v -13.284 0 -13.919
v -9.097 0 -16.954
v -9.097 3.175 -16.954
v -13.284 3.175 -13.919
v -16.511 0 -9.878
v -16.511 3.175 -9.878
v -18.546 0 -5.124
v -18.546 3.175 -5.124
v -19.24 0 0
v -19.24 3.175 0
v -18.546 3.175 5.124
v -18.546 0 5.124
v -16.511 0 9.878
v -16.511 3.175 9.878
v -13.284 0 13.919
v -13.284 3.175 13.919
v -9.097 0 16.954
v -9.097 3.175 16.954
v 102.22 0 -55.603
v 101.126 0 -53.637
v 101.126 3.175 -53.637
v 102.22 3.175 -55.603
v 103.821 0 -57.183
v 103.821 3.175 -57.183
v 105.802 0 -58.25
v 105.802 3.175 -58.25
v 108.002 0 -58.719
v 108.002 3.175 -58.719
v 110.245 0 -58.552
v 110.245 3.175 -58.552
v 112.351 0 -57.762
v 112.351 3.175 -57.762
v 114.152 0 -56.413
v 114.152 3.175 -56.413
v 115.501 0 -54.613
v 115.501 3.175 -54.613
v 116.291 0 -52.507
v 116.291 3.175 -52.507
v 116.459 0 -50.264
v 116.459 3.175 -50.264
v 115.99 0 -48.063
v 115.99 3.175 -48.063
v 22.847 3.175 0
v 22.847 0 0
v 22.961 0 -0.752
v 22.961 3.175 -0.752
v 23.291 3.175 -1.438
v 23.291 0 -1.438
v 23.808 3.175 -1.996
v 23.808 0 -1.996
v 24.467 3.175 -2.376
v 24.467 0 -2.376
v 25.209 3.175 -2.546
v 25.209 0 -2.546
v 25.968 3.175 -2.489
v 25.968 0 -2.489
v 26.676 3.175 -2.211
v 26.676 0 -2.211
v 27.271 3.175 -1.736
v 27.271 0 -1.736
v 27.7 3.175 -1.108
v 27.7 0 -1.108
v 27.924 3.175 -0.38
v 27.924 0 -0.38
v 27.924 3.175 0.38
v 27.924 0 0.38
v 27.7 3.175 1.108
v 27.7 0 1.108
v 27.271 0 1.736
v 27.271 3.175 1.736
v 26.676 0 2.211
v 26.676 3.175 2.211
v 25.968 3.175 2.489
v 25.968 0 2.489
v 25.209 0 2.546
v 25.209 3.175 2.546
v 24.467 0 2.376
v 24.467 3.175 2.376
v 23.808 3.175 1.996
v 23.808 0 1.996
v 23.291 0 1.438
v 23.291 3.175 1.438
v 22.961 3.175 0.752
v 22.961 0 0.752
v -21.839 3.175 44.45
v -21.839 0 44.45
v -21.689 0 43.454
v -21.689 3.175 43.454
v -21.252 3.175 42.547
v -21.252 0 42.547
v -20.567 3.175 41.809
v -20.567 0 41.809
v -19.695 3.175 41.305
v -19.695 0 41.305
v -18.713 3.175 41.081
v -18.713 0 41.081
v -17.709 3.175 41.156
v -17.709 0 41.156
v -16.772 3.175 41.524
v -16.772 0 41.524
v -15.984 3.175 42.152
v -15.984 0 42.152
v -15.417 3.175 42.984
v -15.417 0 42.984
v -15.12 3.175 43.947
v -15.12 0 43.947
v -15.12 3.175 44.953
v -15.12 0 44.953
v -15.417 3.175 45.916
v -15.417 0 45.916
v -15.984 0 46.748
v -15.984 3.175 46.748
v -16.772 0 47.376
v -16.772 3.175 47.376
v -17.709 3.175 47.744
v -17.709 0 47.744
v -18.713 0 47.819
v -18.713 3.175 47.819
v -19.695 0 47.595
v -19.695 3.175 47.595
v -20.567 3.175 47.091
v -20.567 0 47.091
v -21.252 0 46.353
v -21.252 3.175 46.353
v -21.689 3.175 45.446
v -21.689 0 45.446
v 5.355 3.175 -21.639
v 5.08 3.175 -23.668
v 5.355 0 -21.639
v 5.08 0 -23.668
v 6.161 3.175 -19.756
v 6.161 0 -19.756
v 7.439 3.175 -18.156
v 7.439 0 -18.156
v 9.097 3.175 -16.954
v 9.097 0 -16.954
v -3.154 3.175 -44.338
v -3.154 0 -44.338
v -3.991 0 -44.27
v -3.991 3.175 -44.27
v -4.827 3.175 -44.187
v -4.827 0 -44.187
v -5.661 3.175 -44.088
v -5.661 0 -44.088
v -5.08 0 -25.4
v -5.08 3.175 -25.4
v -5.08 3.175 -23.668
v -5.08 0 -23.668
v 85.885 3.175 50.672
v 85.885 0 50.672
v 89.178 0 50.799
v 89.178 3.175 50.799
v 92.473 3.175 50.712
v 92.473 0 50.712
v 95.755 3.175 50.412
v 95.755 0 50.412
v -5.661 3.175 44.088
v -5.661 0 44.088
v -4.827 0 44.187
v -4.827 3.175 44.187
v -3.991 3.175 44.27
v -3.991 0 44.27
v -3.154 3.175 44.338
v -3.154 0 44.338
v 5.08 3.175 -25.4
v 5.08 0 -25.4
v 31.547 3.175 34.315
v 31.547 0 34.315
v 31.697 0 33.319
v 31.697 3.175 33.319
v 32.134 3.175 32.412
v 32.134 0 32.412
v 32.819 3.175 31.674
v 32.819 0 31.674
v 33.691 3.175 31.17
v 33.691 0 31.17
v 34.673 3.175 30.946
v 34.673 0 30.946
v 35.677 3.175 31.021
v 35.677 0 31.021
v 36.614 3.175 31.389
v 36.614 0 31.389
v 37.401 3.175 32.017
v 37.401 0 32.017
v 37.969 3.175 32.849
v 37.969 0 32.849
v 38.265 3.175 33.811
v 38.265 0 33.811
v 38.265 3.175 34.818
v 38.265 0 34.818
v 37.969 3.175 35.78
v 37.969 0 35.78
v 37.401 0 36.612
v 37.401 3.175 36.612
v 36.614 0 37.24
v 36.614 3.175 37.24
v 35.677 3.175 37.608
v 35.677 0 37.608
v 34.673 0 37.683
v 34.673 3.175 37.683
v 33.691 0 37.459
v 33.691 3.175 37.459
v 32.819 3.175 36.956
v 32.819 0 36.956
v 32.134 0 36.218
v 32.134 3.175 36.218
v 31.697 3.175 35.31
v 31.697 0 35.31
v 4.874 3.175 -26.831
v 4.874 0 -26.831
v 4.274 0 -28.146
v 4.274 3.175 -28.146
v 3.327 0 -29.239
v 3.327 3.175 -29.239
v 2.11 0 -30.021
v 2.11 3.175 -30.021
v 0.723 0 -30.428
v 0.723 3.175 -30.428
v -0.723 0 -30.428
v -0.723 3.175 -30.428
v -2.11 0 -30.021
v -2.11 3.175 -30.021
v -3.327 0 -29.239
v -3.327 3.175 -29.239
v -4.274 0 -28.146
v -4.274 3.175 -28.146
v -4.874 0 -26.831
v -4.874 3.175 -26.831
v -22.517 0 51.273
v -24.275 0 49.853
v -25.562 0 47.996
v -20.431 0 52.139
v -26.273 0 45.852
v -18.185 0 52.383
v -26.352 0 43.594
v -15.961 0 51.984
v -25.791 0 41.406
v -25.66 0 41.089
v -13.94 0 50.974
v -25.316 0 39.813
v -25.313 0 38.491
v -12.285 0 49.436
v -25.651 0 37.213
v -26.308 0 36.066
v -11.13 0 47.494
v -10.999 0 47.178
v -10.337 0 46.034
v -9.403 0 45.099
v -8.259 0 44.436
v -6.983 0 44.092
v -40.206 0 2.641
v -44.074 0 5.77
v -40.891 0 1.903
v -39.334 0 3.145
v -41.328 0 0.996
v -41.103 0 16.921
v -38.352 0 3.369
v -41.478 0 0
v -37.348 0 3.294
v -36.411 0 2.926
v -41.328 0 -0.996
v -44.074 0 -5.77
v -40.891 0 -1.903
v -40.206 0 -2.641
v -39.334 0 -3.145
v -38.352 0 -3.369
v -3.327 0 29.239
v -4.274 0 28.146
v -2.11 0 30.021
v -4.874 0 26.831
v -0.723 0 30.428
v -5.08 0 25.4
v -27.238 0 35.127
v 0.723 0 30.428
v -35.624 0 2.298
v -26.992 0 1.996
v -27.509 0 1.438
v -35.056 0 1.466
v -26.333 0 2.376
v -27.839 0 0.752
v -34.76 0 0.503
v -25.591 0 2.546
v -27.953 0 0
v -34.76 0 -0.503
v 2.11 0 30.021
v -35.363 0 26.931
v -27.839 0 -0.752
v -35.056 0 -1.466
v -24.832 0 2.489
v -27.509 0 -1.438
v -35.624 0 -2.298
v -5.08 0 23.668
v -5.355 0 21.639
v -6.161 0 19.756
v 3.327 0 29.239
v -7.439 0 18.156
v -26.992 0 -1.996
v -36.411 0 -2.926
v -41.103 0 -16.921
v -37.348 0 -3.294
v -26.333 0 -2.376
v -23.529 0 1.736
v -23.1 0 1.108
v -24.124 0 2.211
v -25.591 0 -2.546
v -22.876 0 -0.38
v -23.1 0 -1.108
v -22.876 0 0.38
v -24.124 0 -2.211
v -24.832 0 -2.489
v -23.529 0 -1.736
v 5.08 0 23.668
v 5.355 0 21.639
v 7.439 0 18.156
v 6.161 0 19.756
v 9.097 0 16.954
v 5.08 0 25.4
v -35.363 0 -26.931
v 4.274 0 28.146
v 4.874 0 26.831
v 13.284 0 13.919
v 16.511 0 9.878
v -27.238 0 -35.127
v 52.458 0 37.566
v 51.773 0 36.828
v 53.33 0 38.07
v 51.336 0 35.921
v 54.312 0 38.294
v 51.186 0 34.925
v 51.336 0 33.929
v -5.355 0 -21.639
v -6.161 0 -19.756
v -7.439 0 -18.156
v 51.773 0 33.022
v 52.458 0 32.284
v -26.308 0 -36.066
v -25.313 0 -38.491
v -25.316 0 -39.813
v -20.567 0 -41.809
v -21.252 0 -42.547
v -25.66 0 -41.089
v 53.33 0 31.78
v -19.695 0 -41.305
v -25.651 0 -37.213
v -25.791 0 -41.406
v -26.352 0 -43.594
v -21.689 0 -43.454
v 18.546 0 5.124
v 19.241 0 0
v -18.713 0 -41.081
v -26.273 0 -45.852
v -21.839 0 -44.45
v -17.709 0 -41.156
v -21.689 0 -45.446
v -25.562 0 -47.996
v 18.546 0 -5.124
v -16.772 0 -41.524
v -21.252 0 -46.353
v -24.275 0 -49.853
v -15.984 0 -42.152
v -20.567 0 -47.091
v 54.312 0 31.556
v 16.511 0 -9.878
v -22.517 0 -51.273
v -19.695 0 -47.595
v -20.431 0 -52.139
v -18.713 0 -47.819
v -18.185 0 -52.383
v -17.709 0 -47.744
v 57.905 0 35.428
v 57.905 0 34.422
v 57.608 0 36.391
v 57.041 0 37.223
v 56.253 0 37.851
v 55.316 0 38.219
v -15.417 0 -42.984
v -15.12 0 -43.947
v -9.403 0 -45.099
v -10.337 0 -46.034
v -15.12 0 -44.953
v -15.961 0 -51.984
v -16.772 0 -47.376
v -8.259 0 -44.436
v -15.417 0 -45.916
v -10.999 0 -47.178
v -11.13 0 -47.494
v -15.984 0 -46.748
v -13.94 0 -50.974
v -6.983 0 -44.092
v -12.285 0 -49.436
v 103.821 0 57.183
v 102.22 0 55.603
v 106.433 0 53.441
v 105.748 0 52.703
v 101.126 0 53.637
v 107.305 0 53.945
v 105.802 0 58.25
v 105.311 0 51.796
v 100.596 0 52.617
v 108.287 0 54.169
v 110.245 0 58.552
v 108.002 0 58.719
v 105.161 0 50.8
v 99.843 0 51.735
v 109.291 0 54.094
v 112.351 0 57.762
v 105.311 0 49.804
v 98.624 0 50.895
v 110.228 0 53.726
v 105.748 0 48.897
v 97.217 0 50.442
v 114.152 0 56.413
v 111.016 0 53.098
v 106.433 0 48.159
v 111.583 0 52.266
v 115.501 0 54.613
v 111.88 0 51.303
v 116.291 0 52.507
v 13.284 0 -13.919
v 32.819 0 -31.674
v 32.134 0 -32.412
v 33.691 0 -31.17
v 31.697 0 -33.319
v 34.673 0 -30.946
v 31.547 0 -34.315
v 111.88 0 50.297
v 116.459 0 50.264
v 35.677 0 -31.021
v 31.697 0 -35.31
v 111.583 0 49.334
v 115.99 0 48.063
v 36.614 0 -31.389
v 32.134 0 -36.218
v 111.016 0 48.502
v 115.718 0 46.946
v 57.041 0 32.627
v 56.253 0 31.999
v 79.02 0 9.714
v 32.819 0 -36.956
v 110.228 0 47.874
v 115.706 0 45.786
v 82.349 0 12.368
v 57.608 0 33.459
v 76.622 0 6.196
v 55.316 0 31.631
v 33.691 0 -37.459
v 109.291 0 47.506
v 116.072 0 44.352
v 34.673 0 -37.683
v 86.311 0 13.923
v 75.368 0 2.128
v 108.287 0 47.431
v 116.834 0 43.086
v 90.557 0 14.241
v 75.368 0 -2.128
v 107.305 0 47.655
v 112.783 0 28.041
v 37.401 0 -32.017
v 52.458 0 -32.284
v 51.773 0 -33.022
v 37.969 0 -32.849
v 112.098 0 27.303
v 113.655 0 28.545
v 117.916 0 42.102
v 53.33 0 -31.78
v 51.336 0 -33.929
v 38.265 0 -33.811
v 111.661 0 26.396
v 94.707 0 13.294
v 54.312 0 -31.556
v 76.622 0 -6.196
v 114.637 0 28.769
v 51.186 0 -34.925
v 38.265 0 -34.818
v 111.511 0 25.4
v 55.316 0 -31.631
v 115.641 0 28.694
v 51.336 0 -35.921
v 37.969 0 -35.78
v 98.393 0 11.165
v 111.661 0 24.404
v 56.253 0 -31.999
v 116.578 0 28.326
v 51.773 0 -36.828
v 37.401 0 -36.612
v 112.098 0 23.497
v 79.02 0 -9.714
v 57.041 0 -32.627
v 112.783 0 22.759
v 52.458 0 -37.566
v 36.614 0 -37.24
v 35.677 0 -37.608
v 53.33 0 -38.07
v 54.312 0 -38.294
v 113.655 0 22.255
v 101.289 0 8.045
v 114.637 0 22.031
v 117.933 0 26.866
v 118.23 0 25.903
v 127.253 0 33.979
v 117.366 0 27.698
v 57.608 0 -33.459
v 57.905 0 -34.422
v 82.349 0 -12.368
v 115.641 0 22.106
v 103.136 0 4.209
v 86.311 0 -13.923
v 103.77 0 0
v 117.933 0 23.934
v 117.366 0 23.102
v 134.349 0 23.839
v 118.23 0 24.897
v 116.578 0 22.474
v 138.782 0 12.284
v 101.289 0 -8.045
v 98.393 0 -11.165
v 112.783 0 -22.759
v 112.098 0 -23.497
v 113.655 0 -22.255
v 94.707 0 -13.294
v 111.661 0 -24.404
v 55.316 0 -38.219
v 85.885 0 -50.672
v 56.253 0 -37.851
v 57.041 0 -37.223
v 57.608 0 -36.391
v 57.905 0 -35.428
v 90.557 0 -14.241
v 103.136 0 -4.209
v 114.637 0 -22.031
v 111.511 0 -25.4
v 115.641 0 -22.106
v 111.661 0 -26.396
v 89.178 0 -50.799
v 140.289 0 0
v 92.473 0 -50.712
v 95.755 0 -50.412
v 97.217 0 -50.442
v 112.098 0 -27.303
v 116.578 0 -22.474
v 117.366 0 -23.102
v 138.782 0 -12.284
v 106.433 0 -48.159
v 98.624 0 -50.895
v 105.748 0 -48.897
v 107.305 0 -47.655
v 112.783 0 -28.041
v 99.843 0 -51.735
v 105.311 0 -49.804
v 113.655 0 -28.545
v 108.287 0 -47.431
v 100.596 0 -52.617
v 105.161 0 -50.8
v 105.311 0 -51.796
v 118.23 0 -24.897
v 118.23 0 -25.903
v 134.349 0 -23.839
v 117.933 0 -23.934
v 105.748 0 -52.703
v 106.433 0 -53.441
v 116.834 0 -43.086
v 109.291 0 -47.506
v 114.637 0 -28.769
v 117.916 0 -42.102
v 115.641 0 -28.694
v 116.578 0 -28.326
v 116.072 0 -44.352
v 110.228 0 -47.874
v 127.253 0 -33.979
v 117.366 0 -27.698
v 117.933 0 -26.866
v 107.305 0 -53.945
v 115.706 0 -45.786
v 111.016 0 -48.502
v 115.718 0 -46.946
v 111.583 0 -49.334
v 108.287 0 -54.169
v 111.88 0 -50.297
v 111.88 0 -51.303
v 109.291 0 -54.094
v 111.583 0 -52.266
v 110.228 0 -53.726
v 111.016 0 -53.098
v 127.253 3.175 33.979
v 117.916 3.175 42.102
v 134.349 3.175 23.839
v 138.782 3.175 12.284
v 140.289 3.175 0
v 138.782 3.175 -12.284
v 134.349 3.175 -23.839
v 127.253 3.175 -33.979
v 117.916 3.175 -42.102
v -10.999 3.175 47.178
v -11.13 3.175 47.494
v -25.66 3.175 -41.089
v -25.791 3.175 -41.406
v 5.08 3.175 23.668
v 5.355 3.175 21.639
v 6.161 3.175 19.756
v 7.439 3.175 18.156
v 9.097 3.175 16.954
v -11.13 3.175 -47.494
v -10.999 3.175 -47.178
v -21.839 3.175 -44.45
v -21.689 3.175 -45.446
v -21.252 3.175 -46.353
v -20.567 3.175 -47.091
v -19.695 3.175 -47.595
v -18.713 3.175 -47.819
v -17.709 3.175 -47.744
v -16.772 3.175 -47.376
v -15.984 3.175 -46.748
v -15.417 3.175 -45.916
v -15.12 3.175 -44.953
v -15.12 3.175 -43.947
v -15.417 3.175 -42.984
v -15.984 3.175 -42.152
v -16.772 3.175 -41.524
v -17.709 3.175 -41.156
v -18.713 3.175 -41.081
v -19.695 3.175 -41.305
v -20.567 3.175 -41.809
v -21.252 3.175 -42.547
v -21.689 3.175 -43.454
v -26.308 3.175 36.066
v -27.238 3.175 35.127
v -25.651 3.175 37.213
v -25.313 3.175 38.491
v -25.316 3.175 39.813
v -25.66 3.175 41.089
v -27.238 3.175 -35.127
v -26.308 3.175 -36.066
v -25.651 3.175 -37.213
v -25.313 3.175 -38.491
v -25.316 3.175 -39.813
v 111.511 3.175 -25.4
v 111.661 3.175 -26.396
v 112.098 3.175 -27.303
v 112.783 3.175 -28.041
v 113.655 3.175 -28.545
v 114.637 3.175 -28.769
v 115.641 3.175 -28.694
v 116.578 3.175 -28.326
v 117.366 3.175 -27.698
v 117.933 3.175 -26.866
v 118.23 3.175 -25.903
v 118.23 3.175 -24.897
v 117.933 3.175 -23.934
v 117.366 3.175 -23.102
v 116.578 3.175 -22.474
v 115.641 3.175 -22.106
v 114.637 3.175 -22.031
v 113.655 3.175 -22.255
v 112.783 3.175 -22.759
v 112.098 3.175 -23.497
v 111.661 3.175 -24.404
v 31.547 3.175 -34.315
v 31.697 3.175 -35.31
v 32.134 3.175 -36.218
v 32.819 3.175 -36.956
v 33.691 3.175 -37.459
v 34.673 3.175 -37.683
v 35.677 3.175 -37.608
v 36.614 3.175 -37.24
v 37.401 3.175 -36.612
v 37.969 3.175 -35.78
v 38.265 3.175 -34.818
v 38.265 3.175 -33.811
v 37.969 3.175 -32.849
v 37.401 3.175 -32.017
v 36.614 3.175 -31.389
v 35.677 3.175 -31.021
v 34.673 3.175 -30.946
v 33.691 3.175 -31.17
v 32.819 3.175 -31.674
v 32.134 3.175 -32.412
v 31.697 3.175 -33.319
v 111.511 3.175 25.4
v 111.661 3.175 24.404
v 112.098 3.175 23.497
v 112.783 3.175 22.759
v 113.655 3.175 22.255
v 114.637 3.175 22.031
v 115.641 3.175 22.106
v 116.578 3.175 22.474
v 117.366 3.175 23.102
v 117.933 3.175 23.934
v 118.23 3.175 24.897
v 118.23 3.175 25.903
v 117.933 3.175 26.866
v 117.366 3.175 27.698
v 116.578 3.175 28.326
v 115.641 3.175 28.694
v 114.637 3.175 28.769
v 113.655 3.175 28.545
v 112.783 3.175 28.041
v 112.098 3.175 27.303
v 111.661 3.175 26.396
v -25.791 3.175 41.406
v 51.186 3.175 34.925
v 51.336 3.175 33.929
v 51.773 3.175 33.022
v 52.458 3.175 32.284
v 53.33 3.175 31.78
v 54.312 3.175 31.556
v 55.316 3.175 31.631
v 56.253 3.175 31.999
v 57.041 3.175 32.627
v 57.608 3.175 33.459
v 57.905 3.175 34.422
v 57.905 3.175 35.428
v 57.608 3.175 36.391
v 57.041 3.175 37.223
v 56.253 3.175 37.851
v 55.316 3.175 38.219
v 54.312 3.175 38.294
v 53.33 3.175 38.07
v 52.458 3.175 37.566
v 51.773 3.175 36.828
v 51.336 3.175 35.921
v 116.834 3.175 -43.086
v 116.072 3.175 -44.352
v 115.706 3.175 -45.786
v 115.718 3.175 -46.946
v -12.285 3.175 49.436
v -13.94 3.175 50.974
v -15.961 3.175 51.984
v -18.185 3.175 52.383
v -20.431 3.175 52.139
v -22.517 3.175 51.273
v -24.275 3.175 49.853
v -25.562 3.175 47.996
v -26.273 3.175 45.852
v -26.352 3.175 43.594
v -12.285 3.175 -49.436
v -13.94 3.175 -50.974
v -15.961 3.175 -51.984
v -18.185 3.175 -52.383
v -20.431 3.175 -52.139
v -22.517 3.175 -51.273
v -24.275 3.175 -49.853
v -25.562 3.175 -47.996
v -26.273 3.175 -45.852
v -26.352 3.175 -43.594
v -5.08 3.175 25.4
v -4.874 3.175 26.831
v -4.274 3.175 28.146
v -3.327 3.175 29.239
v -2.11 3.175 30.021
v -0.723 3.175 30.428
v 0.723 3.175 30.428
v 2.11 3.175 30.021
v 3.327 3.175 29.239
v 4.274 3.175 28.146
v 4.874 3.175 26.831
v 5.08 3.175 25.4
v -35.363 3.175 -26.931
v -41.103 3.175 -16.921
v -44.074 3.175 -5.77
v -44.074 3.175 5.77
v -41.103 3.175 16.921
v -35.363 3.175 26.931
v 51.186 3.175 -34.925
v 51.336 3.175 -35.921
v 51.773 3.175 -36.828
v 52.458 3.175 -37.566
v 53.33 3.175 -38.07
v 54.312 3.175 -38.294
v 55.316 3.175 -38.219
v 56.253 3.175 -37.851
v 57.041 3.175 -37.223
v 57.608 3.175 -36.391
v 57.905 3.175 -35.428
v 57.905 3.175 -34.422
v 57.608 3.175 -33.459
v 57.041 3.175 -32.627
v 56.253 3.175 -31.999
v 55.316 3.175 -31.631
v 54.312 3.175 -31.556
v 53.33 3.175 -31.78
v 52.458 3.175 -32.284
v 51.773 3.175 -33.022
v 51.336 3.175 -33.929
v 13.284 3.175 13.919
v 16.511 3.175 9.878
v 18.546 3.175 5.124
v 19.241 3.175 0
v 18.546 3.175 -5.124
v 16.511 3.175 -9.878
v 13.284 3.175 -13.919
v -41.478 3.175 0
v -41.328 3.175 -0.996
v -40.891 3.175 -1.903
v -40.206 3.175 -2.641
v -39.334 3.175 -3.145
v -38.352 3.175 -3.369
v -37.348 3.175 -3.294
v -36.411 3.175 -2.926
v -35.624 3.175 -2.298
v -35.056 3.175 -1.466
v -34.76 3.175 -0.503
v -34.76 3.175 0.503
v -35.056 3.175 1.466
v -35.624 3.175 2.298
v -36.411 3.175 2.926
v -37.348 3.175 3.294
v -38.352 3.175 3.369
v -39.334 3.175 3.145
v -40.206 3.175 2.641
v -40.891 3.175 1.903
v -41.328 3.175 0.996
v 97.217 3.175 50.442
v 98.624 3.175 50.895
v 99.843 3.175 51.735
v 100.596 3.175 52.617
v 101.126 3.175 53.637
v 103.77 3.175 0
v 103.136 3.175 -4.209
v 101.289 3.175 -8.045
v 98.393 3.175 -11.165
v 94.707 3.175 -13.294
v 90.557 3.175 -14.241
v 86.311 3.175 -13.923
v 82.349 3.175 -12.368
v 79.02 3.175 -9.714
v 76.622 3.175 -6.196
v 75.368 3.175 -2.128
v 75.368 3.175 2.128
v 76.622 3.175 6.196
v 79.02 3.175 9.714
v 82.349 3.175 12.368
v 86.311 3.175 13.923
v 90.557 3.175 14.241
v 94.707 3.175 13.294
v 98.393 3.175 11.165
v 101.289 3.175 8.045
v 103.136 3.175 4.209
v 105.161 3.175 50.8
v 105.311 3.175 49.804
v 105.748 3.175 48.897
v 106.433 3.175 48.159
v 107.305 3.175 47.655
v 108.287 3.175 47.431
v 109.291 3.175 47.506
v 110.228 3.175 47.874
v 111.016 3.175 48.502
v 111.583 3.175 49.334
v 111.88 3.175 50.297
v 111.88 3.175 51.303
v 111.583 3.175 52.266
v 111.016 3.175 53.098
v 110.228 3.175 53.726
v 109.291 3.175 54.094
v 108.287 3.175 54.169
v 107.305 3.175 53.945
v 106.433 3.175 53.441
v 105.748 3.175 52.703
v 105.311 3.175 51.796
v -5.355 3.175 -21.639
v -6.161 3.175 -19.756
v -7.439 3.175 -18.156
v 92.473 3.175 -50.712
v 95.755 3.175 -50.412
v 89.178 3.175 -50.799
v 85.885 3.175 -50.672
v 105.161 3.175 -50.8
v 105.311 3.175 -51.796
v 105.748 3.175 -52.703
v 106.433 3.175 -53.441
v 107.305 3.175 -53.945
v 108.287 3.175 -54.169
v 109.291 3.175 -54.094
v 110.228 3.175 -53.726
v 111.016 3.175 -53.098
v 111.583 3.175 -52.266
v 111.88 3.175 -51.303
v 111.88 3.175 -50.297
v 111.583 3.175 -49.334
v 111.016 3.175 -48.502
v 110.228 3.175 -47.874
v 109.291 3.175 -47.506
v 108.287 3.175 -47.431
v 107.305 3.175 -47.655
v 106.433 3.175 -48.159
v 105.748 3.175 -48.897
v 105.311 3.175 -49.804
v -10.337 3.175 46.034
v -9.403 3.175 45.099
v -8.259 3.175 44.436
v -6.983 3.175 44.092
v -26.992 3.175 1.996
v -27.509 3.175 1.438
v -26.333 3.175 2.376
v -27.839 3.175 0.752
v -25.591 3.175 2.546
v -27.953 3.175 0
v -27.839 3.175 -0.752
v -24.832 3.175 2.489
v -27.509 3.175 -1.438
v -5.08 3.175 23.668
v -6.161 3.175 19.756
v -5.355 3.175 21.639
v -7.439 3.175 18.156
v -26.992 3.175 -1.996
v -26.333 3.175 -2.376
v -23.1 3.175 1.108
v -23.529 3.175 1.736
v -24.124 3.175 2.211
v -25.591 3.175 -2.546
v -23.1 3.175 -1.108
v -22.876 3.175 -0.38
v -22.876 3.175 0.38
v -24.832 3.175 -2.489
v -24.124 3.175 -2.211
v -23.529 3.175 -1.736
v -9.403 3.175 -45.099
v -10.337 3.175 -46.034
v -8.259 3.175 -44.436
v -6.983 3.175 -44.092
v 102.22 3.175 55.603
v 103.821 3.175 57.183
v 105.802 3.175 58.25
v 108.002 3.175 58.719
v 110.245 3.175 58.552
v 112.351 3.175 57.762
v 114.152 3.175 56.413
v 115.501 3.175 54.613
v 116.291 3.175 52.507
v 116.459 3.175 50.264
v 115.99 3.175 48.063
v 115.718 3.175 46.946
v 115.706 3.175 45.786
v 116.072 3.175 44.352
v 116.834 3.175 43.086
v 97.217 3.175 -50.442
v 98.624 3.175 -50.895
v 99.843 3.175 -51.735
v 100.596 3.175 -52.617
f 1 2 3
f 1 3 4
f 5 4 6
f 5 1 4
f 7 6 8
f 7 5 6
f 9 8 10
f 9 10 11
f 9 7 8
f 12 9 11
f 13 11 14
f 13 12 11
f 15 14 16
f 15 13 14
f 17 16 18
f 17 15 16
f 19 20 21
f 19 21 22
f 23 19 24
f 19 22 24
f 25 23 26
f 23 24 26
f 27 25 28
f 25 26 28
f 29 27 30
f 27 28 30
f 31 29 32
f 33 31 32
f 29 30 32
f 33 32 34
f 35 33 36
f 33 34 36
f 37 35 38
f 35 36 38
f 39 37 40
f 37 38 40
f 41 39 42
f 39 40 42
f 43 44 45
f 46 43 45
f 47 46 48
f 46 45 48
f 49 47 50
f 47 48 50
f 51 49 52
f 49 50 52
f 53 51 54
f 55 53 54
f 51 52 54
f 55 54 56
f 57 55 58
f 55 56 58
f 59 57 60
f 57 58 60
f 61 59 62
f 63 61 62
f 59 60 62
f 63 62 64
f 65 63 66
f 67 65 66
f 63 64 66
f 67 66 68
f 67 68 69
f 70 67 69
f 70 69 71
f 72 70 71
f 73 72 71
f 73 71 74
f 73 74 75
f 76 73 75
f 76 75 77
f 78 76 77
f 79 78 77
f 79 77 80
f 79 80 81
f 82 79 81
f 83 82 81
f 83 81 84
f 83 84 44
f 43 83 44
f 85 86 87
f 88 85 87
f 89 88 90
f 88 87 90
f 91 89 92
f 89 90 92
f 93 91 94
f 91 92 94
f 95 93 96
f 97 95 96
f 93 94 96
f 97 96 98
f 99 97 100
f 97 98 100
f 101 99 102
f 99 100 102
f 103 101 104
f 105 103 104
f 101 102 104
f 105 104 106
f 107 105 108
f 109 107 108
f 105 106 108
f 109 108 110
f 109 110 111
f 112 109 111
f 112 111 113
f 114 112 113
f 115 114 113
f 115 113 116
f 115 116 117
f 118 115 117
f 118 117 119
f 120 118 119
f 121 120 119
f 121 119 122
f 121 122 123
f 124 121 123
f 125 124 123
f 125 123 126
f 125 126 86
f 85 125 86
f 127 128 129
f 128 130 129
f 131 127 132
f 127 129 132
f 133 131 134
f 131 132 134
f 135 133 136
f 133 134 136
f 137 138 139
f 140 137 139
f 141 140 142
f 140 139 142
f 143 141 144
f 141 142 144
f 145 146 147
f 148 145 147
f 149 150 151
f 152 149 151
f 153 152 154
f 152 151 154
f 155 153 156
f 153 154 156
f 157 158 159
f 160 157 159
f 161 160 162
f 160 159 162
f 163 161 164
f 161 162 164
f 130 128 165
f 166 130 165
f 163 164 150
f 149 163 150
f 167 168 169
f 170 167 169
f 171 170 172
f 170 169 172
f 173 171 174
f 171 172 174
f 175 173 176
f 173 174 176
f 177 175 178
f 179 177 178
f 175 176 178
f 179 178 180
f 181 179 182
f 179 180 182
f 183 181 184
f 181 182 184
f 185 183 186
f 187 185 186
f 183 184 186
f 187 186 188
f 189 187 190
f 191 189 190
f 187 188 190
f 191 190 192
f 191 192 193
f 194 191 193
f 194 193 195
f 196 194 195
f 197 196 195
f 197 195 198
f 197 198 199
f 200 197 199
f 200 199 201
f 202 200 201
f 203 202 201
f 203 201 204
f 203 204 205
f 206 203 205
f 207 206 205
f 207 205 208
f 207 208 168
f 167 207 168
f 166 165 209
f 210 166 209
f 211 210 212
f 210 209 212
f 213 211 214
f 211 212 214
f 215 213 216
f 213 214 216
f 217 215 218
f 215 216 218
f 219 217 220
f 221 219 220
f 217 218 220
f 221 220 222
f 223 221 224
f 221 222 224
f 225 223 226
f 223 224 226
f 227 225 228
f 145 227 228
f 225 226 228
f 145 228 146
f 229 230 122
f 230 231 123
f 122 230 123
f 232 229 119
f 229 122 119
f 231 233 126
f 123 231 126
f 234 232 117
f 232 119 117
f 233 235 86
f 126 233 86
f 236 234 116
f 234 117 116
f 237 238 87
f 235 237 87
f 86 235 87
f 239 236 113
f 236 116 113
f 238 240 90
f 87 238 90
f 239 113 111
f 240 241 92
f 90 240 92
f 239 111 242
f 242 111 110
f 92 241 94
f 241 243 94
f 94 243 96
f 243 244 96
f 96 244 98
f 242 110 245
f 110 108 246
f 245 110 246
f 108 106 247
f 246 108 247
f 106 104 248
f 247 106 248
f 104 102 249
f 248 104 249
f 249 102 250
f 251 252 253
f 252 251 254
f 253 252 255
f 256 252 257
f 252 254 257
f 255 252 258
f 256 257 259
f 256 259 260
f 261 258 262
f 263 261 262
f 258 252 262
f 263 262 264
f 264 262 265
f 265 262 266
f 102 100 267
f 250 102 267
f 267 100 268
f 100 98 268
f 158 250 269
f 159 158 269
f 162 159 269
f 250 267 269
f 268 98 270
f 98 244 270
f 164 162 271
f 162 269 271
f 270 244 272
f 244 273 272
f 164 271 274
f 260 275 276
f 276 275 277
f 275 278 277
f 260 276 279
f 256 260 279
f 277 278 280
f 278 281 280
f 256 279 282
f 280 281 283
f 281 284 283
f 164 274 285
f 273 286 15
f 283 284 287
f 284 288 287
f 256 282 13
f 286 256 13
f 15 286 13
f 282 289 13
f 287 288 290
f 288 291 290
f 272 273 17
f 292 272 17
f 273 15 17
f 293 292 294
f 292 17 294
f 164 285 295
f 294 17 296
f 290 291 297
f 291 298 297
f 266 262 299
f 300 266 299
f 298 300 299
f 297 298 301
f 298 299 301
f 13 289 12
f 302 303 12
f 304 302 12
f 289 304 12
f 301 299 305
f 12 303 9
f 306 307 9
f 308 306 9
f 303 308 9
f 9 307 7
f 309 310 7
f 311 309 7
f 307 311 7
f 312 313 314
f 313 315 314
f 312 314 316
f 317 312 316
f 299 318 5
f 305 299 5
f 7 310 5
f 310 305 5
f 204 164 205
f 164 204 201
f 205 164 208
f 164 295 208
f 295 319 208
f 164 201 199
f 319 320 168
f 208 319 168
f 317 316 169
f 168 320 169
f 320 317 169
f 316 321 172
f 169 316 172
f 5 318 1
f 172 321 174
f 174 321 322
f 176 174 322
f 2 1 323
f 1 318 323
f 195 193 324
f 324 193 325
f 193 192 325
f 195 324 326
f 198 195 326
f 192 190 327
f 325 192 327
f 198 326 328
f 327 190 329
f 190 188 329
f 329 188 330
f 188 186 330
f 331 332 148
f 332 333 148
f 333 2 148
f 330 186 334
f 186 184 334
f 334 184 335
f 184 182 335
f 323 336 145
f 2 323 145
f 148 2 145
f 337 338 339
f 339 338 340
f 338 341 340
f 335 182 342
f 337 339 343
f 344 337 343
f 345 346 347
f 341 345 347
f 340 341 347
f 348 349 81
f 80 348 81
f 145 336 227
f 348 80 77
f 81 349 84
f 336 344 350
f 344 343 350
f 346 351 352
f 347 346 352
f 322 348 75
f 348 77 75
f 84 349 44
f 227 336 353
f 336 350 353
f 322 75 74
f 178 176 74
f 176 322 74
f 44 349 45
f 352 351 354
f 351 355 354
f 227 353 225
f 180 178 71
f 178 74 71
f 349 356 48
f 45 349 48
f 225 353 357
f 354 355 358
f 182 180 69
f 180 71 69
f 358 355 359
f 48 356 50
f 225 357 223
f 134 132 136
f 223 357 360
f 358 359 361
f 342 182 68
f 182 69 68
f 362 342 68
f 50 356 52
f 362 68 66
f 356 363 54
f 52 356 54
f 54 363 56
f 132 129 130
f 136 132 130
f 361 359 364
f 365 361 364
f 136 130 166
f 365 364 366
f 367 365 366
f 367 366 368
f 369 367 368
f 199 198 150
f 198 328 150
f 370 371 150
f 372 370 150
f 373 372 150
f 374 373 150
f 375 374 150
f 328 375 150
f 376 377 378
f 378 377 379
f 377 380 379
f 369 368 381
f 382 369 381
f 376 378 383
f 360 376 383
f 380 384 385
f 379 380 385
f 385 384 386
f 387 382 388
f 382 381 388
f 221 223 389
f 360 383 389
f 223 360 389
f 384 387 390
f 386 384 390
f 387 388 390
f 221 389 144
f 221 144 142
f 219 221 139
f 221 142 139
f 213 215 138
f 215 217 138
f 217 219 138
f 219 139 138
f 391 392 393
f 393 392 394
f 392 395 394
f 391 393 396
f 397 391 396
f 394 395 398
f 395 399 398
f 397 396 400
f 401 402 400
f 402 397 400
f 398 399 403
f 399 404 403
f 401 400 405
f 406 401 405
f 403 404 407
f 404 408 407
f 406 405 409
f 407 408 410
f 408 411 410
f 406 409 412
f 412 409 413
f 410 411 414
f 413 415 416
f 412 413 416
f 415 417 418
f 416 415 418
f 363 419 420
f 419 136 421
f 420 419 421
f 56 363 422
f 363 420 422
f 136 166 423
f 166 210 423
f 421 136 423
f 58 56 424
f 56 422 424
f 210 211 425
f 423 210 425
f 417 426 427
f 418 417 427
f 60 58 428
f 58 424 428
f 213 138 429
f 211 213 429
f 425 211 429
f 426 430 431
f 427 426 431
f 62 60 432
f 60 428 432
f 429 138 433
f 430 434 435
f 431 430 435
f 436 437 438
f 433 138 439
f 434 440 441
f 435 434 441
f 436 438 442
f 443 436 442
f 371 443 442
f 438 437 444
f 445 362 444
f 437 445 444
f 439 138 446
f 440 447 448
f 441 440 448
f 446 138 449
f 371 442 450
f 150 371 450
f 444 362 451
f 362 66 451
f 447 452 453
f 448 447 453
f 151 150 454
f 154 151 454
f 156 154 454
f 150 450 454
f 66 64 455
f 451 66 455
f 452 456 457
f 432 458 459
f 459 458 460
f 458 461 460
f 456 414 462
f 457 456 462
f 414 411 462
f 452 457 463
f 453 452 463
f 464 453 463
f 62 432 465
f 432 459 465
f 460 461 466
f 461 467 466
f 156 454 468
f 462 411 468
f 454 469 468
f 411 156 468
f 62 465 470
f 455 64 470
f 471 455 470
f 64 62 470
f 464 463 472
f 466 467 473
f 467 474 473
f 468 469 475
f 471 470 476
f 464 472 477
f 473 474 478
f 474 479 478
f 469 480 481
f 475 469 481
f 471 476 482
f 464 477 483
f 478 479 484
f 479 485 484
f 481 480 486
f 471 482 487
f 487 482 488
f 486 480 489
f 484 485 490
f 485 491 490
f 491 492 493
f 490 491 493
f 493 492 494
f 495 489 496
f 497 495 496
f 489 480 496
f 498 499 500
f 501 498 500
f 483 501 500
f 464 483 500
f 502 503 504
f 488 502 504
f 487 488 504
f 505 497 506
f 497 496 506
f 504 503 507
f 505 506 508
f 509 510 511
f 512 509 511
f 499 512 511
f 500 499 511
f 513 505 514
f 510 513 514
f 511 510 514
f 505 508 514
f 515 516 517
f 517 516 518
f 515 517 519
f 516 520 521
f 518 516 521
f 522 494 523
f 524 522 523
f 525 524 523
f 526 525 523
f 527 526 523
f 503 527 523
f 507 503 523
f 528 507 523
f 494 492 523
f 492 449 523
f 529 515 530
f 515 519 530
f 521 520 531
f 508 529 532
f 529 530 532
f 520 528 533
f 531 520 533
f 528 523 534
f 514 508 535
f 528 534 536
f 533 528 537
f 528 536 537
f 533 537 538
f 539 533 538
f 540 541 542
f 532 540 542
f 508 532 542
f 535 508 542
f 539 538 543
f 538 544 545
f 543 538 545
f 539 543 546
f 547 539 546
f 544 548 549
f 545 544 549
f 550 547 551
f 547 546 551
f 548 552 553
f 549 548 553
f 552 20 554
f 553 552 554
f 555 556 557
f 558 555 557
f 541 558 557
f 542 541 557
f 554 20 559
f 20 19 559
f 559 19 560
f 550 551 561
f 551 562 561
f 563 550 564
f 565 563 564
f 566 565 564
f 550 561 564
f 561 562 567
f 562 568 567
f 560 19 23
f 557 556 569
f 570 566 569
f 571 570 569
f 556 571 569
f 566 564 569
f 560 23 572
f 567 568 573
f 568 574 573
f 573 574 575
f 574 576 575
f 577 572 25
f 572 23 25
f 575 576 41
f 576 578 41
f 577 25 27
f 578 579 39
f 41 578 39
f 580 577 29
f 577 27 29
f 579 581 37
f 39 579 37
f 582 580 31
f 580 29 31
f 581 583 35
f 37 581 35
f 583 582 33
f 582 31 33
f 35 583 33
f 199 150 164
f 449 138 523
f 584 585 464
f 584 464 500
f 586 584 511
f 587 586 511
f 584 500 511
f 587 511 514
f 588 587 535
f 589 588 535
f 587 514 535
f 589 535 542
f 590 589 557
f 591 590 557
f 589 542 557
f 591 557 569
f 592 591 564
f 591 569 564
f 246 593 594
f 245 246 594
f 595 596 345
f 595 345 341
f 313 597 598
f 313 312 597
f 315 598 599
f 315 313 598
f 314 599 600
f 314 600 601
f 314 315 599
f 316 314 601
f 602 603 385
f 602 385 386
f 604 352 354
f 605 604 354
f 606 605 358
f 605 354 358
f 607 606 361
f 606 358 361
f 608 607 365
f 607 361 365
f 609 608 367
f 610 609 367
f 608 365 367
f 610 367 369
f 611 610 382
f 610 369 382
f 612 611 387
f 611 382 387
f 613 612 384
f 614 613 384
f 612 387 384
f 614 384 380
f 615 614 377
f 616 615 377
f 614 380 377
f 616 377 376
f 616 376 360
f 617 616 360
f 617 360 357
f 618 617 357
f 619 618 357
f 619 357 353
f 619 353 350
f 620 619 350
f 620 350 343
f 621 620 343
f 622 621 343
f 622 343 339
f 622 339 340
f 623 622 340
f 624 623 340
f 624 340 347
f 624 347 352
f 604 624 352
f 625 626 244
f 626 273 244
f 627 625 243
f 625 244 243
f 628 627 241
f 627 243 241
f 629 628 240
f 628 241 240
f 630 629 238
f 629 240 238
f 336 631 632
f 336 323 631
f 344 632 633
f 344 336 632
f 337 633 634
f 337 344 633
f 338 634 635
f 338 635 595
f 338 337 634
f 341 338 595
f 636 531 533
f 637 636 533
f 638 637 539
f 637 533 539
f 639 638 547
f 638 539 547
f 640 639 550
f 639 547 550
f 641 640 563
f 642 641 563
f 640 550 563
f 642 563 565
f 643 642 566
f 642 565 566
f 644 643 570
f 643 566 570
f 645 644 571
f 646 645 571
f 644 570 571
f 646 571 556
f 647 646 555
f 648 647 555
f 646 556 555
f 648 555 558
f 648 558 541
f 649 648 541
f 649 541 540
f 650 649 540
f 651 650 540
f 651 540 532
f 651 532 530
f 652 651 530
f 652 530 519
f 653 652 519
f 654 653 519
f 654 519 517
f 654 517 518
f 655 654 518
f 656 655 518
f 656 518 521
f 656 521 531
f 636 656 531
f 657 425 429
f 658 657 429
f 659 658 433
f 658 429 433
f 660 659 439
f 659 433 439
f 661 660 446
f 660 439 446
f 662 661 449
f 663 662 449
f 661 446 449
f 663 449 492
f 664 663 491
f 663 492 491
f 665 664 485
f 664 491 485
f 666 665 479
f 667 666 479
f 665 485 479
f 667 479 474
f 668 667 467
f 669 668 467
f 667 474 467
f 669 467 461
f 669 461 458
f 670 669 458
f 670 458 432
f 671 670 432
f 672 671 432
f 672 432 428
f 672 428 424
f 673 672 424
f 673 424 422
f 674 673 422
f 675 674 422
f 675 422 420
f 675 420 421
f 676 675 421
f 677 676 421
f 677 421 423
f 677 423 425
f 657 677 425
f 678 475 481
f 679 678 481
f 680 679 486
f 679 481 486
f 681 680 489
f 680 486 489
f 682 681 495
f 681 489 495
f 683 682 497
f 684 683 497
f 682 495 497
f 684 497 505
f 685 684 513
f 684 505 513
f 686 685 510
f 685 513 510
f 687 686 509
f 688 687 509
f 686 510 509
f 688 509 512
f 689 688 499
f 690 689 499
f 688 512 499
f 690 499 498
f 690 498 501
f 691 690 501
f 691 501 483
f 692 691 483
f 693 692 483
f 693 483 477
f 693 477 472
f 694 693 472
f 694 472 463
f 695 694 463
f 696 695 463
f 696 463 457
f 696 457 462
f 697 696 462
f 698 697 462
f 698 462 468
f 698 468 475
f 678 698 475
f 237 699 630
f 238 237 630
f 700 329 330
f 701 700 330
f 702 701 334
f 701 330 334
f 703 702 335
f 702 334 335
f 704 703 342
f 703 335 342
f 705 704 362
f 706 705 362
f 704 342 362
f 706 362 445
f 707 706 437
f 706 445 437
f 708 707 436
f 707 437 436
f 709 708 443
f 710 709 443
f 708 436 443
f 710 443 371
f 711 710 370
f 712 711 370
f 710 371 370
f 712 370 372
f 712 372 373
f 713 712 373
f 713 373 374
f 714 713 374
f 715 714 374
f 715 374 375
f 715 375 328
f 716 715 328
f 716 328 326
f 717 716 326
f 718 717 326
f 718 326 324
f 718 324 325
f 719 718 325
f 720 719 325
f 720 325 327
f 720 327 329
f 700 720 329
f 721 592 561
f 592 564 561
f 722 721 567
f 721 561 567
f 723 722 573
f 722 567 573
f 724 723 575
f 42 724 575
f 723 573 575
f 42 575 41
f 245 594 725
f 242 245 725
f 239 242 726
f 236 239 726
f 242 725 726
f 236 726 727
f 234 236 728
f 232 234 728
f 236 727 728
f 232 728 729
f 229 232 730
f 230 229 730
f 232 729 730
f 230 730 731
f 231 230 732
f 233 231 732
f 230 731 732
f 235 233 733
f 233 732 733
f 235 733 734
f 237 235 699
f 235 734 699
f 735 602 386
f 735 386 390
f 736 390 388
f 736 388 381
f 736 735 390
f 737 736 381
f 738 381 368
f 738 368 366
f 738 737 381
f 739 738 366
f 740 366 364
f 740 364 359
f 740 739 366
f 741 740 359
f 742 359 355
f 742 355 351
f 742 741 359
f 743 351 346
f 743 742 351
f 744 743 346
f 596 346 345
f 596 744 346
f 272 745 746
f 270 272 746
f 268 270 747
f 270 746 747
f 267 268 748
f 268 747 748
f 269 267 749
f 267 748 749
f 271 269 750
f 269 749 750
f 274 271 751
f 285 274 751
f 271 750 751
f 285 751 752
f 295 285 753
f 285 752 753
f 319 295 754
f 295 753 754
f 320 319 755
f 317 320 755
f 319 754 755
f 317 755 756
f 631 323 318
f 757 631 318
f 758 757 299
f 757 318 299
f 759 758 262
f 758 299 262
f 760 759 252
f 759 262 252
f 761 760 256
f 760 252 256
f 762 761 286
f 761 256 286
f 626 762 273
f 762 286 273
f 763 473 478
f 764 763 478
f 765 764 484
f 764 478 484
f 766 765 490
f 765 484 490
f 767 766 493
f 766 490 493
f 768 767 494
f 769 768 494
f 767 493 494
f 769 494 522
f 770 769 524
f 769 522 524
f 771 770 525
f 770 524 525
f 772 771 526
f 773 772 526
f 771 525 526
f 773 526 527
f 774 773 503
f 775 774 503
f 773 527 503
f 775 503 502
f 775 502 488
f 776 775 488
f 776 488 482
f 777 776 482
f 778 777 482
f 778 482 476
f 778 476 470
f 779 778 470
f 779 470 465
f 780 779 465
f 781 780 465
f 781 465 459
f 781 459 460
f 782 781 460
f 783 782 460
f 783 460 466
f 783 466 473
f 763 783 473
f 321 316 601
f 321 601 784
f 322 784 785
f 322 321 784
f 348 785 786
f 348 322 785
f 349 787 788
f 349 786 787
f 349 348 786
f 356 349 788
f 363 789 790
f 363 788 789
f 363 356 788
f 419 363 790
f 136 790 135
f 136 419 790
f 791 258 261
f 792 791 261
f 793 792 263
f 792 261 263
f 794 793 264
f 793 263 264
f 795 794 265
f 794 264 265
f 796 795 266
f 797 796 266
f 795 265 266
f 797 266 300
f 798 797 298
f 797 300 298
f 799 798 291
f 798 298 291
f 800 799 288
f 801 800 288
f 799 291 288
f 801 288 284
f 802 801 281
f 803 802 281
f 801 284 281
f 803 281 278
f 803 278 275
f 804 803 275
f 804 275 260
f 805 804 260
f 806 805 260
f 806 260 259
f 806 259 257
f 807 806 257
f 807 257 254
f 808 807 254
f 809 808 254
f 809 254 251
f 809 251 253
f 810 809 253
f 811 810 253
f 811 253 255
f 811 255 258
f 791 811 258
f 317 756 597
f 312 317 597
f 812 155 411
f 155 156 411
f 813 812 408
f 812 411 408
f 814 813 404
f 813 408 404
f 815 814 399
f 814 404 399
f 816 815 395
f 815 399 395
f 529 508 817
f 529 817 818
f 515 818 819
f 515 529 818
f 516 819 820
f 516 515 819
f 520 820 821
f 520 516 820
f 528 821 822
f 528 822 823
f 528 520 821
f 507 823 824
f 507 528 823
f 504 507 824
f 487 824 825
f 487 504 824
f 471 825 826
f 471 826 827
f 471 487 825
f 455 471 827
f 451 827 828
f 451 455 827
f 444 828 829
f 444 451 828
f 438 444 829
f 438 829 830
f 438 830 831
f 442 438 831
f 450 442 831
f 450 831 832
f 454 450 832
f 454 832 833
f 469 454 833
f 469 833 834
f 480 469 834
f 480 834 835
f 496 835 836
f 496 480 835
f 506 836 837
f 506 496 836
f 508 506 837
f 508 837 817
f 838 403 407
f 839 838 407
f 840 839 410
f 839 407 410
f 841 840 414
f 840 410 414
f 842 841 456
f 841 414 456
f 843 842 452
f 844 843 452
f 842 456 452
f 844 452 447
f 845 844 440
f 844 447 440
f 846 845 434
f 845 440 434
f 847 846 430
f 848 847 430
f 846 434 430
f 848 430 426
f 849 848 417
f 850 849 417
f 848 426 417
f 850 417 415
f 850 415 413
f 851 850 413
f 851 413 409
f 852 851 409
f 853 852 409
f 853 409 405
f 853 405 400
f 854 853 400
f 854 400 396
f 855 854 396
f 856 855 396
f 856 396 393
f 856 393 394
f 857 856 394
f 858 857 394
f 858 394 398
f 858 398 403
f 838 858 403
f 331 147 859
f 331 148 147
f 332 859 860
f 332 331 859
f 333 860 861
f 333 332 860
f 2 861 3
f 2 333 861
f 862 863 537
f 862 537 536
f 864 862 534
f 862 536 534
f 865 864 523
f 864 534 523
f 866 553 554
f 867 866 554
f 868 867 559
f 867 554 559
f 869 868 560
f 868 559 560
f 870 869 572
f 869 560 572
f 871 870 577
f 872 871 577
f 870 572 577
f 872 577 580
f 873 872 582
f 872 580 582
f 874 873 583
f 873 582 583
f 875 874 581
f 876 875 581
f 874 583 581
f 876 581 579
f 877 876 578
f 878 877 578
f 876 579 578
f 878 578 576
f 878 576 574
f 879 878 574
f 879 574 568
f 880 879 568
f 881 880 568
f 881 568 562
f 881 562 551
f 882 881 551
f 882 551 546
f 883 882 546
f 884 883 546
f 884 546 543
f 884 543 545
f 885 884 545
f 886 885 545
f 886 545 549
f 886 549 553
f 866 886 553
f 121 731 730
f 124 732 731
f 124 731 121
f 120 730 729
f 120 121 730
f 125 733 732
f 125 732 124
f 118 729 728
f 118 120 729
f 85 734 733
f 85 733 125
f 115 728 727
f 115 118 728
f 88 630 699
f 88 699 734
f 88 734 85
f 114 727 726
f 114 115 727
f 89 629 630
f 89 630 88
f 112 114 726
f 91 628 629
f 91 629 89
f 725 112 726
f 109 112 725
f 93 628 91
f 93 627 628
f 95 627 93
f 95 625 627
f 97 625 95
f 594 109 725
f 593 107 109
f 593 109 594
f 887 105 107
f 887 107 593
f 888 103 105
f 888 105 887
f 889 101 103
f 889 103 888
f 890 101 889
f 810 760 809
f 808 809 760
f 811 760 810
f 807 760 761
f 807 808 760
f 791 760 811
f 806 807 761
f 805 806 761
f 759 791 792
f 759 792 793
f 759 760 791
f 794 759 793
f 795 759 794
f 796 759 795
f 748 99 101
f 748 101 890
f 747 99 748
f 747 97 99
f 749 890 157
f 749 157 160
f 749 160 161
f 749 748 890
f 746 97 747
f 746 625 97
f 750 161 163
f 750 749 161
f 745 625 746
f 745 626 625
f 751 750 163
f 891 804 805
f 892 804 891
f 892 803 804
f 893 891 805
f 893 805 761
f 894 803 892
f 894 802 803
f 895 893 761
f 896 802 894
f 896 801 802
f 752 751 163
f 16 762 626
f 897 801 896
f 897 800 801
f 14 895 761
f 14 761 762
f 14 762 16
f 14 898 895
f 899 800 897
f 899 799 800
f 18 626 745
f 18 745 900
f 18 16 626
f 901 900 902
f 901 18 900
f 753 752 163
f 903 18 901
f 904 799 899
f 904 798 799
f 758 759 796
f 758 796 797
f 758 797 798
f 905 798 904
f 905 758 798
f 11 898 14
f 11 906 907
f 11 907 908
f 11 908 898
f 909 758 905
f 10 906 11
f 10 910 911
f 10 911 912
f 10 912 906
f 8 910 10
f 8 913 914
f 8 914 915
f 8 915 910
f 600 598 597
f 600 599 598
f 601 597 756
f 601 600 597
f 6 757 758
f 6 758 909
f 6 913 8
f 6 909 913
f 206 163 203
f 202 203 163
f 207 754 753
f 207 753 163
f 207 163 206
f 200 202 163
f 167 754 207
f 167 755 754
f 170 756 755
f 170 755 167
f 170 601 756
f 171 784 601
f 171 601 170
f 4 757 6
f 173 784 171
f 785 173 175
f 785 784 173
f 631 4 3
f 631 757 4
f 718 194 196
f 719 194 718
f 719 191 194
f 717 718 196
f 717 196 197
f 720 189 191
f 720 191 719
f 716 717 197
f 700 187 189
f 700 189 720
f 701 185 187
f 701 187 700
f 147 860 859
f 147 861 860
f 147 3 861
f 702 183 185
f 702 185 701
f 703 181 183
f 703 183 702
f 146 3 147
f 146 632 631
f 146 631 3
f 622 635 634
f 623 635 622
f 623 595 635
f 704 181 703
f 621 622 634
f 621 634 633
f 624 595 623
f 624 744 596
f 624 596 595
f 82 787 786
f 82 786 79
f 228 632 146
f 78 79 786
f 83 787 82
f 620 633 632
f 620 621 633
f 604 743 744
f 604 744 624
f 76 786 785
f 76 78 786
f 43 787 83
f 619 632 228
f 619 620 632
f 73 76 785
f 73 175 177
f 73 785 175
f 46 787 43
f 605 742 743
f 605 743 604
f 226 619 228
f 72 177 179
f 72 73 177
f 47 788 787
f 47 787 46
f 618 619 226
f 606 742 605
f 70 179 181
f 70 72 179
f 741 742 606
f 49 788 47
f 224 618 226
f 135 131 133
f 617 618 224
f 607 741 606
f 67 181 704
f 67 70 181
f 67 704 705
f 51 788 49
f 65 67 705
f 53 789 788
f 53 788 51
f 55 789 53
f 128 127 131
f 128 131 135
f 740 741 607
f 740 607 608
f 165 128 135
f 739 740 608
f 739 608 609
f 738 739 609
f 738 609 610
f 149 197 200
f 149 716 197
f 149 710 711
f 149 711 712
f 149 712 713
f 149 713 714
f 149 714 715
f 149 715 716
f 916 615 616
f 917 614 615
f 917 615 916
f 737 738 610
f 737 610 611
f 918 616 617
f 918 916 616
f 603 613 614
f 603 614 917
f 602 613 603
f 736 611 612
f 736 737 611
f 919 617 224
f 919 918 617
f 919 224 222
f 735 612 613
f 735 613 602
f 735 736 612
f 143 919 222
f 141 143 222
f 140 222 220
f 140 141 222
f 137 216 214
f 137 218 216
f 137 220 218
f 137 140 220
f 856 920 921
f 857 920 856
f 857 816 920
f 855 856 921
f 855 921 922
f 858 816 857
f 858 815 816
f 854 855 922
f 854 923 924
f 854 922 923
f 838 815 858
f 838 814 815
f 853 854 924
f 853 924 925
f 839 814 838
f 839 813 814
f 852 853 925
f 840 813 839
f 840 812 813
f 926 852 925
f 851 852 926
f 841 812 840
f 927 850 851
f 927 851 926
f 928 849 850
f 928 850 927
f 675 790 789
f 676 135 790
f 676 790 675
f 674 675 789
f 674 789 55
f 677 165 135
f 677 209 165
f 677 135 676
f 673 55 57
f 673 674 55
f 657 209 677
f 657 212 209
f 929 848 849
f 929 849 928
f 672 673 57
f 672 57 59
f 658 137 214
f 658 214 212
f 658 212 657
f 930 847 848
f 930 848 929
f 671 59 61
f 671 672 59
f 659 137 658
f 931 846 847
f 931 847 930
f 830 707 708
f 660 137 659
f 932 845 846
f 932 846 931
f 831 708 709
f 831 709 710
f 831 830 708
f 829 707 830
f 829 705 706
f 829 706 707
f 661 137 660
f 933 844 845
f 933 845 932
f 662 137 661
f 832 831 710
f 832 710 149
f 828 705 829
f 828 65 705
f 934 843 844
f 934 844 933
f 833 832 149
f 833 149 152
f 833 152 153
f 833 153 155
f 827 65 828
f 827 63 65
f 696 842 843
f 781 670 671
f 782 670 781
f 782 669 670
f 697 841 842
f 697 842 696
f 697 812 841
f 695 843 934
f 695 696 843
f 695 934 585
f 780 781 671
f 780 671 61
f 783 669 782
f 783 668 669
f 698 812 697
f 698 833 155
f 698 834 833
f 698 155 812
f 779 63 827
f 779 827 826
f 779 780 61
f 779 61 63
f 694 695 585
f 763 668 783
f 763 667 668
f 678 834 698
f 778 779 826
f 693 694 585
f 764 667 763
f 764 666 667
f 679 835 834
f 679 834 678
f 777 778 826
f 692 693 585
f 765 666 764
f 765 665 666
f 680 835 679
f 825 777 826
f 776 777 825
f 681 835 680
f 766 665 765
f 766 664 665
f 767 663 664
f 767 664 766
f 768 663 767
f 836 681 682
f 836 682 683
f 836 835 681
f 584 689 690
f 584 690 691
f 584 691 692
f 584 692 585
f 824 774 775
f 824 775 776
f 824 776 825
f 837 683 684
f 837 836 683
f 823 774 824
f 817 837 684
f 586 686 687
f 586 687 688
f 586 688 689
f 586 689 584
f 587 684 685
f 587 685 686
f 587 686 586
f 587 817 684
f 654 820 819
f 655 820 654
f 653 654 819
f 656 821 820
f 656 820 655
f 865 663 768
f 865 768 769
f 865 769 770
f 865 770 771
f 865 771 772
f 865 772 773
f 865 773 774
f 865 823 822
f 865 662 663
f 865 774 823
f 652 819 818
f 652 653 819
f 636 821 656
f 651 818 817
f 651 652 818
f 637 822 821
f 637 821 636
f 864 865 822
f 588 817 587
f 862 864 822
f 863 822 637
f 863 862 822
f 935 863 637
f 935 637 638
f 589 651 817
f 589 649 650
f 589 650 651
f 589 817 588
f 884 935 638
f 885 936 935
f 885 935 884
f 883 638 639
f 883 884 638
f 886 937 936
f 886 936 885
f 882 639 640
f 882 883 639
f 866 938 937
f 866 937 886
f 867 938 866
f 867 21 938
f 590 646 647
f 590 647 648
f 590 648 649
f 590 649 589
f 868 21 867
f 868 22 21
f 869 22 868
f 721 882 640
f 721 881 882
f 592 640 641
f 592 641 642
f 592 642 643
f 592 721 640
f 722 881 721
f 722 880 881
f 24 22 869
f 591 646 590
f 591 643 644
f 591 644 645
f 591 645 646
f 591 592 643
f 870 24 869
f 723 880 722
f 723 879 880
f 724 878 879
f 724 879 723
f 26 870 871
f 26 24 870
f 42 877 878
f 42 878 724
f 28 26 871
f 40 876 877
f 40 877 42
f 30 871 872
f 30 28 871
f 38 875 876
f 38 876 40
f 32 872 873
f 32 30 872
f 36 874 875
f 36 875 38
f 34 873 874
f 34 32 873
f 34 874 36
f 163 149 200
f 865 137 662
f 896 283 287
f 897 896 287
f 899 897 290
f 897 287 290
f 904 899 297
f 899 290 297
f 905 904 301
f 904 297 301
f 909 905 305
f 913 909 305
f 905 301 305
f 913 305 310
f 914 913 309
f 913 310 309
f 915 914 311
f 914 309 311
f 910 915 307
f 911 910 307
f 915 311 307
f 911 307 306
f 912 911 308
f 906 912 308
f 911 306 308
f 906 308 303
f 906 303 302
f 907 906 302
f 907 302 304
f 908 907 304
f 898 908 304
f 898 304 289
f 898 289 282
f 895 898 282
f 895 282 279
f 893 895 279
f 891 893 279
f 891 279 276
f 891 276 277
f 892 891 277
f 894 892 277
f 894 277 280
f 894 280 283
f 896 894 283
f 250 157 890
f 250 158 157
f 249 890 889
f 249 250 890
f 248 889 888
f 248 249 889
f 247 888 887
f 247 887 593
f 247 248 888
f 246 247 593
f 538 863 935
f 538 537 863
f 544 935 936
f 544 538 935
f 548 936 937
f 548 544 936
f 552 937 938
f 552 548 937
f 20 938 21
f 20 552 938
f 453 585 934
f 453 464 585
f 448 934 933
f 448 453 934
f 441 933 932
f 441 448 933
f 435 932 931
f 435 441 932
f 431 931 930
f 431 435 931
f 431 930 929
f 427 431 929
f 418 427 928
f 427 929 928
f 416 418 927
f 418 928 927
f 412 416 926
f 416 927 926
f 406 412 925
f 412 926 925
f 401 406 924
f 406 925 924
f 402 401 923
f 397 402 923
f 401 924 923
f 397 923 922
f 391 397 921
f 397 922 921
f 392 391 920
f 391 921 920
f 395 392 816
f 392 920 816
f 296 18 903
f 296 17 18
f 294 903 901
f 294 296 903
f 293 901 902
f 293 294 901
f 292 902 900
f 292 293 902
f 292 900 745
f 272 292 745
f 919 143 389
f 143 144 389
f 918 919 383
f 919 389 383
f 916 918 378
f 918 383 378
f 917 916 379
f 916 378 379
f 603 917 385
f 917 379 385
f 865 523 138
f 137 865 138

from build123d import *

# Parameters (mm, degrees)
SKETCH1_R               = 14.28115
SKETCH1_R_2             = 19.2405
BOSS_EXTRUDE1_DEPTH     = 3.175
F_10_CLEARANCE_HOLE1_D  = 5.1054
F_1_4_CLEARANCE_HOLE1_D = 6.7564
SKETCH6_R               = 2.5527
CUT_EXTRUDE1_DEPTH      = 4.175
FILLET1_R               = 7.62
BOSS_EXTRUDE3_DEPTH     = 3.175
FILLET2_R               = 5.08
F_1_4_CLEARANCE_HOLE2_D = 6.7564


with BuildPart() as part:
    # Sketch1 → Boss-Extrude1 (new body)
    with BuildSketch(Plane(origin=(0, 0, 0), x_dir=(1, 0, 0), z_dir=(0, 1, 0))):
        with BuildLine():
            Line((85.884602434, 50.671947857), (-3.15409287, 44.337954375))
            ThreePointArc((-3.15409287, 44.337954375), (-44.45, 0), (-3.15409287, -44.337954375))
            Line((-3.15409287, -44.337954375), (85.884602434, -50.671947857))
            ThreePointArc((85.884602434, -50.671947857), (140.28928, 0), (85.884602434, 50.671947857))
        make_face()
        with Locations((89.48928, 0)):
            Circle(SKETCH1_R, mode=Mode.SUBTRACT)
        Circle(SKETCH1_R_2, mode=Mode.SUBTRACT)
    extrude(amount=BOSS_EXTRUDE1_DEPTH)

    # #10 Clearance Hole1 (through all)
    with Locations(Plane(origin=(0, 3.175, 0), x_dir=(1, 0, 0), z_dir=(0, 1, 0))):
        with Locations((0, 25.4), (25.4, 0), (0, -25.4), (-25.4, 0)):
            Hole(F_10_CLEARANCE_HOLE1_D / 2)

    # 1/4 Clearance Hole1 (through all)
    with Locations(Plane(origin=(0, 3.175, 0), x_dir=(1, 0, 0), z_dir=(0, 1, 0))):
        with Locations((54.56428, 34.925), (54.56428, -34.925), (114.88928, 25.4), (114.88928, -25.4), (-38.1, 0), (34.925, -34.314713318), (34.925, 34.314713318)):
            Hole(F_1_4_CLEARANCE_HOLE1_D / 2)

    # Sketch6 → Cut-Extrude1 (cut, through all)
    with BuildSketch(Plane(origin=(0, 3.175, 0), x_dir=(1, 0, 0), z_dir=(0, 1, 0))):
        with BuildLine():
            Line((5.08, 18.55775957), (5.08, 25.4))
            ThreePointArc((5.08, 25.4), (0, 30.48), (-5.08, 25.4))
            Line((-5.08, 25.4), (-5.08, 18.55775957))
            ThreePointArc((-5.08, 18.55775957), (0, 19.2405), (5.08, 18.55775957))
        make_face()
        with Locations((0, 25.4)):
            Circle(SKETCH6_R, mode=Mode.SUBTRACT)
        with BuildLine():
            ThreePointArc((5.08, -18.55775957), (0, -19.2405), (-5.08, -18.55775957))
            Line((-5.08, -18.55775957), (-5.08, -25.4))
            ThreePointArc((-5.08, -25.4), (0, -30.48), (5.08, -25.4))
            Line((5.08, -25.4), (5.08, -18.55775957))
        make_face()
        with Locations((0, -25.4)):
            Circle(SKETCH6_R, mode=Mode.SUBTRACT)
    extrude(amount=-CUT_EXTRUDE1_DEPTH, mode=Mode.SUBTRACT)

    # Fillet1
    fillet1_edges = [part.edges().sort_by_distance(p)[0] for p in [
        (-5.08, 1.5875, 18.55775957),
        (5.08, 1.5875, 18.55775957),
        (5.08, 1.5875, -18.55775957),
        (-5.08, 1.5875, -18.55775957),
    ]]
    fillet(fillet1_edges, radius=FILLET1_R)

    # Sketch8 → Boss-Extrude3 (add)
    with BuildSketch(Plane(origin=(0, 3.175, 0), x_dir=(1, 0, 0), z_dir=(0, 1, 0))):
        with BuildLine():
            Line((114.539380559, -44.194258247), (115.971392847, -48.012957682))
            ThreePointArc((115.971392847, -48.012957682), (111.326322318, -58.232112847), (101.107167153, -53.587042318))
            Line((101.107167153, -53.587042318), (99.675154865, -49.768342882))
            ThreePointArc((99.675154865, -49.768342882), (107.326350833, -47.565522221), (114.539380559, -44.194258247))
        make_face()
        with BuildLine():
            Line((99.675154865, 49.768342882), (101.107167153, 53.587042318))
            ThreePointArc((101.107167153, 53.587042318), (111.326322318, 58.232112847), (115.971392847, 48.012957682))
            Line((115.971392847, 48.012957682), (114.539380559, 44.194258247))
            ThreePointArc((114.539380559, 44.194258247), (107.326350833, 47.565522221), (99.675154865, 49.768342882))
        make_face()
        with BuildLine():
            Line((-9.444374405, -43.435081353), (-11.130282191, -47.494435543))
            ThreePointArc((-11.130282191, -47.494435543), (-21.505155543, -51.780437809), (-25.791157809, -41.405564457))
            Line((-25.791157809, -41.405564457), (-24.105250023, -37.346210267))
            ThreePointArc((-24.105250023, -37.346210267), (-17.048839039, -41.050451732), (-9.444374405, -43.435081353))
        make_face()
        with BuildLine():
            Line((-9.444374405, 43.435081353), (-11.130282191, 47.494435543))
            ThreePointArc((-11.130282191, 47.494435543), (-21.505155543, 51.780437809), (-25.791157809, 41.405564457))
            Line((-25.791157809, 41.405564457), (-24.105250023, 37.346210267))
            ThreePointArc((-24.105250023, 37.346210267), (-17.048839039, 41.050451732), (-9.444374405, 43.435081353))
        make_face()
    extrude(amount=-BOSS_EXTRUDE3_DEPTH)

    # Fillet2
    fillet2_edges = [part.edges().sort_by_distance(p)[0] for p in [
        (99.675154865, 1.5875, -49.768342882),
        (114.539380559, 1.5875, -44.194258247),
        (-9.444374405, 1.5875, -43.435081353),
        (-24.105250023, 1.5875, -37.346210267),
        (-24.105250023, 1.5875, 37.346210267),
        (-9.444374405, 1.5875, 43.435081353),
        (114.539380559, 1.5875, 44.194258247),
        (99.675154865, 1.5875, 49.768342882),
    ]]
    fillet(fillet2_edges, radius=FILLET2_R)

    # 1/4 Clearance Hole2 (through all)
    with Locations(Plane(origin=(0, 3.175, 0), x_dir=(1, 0, 0), z_dir=(0, 1, 0))):
        with Locations((108.53928, -50.8), (-18.46072, -44.45), (-18.46072, 44.45), (108.53928, 50.8)):
            Hole(F_1_4_CLEARANCE_HOLE2_D / 2)


solid = part.part
